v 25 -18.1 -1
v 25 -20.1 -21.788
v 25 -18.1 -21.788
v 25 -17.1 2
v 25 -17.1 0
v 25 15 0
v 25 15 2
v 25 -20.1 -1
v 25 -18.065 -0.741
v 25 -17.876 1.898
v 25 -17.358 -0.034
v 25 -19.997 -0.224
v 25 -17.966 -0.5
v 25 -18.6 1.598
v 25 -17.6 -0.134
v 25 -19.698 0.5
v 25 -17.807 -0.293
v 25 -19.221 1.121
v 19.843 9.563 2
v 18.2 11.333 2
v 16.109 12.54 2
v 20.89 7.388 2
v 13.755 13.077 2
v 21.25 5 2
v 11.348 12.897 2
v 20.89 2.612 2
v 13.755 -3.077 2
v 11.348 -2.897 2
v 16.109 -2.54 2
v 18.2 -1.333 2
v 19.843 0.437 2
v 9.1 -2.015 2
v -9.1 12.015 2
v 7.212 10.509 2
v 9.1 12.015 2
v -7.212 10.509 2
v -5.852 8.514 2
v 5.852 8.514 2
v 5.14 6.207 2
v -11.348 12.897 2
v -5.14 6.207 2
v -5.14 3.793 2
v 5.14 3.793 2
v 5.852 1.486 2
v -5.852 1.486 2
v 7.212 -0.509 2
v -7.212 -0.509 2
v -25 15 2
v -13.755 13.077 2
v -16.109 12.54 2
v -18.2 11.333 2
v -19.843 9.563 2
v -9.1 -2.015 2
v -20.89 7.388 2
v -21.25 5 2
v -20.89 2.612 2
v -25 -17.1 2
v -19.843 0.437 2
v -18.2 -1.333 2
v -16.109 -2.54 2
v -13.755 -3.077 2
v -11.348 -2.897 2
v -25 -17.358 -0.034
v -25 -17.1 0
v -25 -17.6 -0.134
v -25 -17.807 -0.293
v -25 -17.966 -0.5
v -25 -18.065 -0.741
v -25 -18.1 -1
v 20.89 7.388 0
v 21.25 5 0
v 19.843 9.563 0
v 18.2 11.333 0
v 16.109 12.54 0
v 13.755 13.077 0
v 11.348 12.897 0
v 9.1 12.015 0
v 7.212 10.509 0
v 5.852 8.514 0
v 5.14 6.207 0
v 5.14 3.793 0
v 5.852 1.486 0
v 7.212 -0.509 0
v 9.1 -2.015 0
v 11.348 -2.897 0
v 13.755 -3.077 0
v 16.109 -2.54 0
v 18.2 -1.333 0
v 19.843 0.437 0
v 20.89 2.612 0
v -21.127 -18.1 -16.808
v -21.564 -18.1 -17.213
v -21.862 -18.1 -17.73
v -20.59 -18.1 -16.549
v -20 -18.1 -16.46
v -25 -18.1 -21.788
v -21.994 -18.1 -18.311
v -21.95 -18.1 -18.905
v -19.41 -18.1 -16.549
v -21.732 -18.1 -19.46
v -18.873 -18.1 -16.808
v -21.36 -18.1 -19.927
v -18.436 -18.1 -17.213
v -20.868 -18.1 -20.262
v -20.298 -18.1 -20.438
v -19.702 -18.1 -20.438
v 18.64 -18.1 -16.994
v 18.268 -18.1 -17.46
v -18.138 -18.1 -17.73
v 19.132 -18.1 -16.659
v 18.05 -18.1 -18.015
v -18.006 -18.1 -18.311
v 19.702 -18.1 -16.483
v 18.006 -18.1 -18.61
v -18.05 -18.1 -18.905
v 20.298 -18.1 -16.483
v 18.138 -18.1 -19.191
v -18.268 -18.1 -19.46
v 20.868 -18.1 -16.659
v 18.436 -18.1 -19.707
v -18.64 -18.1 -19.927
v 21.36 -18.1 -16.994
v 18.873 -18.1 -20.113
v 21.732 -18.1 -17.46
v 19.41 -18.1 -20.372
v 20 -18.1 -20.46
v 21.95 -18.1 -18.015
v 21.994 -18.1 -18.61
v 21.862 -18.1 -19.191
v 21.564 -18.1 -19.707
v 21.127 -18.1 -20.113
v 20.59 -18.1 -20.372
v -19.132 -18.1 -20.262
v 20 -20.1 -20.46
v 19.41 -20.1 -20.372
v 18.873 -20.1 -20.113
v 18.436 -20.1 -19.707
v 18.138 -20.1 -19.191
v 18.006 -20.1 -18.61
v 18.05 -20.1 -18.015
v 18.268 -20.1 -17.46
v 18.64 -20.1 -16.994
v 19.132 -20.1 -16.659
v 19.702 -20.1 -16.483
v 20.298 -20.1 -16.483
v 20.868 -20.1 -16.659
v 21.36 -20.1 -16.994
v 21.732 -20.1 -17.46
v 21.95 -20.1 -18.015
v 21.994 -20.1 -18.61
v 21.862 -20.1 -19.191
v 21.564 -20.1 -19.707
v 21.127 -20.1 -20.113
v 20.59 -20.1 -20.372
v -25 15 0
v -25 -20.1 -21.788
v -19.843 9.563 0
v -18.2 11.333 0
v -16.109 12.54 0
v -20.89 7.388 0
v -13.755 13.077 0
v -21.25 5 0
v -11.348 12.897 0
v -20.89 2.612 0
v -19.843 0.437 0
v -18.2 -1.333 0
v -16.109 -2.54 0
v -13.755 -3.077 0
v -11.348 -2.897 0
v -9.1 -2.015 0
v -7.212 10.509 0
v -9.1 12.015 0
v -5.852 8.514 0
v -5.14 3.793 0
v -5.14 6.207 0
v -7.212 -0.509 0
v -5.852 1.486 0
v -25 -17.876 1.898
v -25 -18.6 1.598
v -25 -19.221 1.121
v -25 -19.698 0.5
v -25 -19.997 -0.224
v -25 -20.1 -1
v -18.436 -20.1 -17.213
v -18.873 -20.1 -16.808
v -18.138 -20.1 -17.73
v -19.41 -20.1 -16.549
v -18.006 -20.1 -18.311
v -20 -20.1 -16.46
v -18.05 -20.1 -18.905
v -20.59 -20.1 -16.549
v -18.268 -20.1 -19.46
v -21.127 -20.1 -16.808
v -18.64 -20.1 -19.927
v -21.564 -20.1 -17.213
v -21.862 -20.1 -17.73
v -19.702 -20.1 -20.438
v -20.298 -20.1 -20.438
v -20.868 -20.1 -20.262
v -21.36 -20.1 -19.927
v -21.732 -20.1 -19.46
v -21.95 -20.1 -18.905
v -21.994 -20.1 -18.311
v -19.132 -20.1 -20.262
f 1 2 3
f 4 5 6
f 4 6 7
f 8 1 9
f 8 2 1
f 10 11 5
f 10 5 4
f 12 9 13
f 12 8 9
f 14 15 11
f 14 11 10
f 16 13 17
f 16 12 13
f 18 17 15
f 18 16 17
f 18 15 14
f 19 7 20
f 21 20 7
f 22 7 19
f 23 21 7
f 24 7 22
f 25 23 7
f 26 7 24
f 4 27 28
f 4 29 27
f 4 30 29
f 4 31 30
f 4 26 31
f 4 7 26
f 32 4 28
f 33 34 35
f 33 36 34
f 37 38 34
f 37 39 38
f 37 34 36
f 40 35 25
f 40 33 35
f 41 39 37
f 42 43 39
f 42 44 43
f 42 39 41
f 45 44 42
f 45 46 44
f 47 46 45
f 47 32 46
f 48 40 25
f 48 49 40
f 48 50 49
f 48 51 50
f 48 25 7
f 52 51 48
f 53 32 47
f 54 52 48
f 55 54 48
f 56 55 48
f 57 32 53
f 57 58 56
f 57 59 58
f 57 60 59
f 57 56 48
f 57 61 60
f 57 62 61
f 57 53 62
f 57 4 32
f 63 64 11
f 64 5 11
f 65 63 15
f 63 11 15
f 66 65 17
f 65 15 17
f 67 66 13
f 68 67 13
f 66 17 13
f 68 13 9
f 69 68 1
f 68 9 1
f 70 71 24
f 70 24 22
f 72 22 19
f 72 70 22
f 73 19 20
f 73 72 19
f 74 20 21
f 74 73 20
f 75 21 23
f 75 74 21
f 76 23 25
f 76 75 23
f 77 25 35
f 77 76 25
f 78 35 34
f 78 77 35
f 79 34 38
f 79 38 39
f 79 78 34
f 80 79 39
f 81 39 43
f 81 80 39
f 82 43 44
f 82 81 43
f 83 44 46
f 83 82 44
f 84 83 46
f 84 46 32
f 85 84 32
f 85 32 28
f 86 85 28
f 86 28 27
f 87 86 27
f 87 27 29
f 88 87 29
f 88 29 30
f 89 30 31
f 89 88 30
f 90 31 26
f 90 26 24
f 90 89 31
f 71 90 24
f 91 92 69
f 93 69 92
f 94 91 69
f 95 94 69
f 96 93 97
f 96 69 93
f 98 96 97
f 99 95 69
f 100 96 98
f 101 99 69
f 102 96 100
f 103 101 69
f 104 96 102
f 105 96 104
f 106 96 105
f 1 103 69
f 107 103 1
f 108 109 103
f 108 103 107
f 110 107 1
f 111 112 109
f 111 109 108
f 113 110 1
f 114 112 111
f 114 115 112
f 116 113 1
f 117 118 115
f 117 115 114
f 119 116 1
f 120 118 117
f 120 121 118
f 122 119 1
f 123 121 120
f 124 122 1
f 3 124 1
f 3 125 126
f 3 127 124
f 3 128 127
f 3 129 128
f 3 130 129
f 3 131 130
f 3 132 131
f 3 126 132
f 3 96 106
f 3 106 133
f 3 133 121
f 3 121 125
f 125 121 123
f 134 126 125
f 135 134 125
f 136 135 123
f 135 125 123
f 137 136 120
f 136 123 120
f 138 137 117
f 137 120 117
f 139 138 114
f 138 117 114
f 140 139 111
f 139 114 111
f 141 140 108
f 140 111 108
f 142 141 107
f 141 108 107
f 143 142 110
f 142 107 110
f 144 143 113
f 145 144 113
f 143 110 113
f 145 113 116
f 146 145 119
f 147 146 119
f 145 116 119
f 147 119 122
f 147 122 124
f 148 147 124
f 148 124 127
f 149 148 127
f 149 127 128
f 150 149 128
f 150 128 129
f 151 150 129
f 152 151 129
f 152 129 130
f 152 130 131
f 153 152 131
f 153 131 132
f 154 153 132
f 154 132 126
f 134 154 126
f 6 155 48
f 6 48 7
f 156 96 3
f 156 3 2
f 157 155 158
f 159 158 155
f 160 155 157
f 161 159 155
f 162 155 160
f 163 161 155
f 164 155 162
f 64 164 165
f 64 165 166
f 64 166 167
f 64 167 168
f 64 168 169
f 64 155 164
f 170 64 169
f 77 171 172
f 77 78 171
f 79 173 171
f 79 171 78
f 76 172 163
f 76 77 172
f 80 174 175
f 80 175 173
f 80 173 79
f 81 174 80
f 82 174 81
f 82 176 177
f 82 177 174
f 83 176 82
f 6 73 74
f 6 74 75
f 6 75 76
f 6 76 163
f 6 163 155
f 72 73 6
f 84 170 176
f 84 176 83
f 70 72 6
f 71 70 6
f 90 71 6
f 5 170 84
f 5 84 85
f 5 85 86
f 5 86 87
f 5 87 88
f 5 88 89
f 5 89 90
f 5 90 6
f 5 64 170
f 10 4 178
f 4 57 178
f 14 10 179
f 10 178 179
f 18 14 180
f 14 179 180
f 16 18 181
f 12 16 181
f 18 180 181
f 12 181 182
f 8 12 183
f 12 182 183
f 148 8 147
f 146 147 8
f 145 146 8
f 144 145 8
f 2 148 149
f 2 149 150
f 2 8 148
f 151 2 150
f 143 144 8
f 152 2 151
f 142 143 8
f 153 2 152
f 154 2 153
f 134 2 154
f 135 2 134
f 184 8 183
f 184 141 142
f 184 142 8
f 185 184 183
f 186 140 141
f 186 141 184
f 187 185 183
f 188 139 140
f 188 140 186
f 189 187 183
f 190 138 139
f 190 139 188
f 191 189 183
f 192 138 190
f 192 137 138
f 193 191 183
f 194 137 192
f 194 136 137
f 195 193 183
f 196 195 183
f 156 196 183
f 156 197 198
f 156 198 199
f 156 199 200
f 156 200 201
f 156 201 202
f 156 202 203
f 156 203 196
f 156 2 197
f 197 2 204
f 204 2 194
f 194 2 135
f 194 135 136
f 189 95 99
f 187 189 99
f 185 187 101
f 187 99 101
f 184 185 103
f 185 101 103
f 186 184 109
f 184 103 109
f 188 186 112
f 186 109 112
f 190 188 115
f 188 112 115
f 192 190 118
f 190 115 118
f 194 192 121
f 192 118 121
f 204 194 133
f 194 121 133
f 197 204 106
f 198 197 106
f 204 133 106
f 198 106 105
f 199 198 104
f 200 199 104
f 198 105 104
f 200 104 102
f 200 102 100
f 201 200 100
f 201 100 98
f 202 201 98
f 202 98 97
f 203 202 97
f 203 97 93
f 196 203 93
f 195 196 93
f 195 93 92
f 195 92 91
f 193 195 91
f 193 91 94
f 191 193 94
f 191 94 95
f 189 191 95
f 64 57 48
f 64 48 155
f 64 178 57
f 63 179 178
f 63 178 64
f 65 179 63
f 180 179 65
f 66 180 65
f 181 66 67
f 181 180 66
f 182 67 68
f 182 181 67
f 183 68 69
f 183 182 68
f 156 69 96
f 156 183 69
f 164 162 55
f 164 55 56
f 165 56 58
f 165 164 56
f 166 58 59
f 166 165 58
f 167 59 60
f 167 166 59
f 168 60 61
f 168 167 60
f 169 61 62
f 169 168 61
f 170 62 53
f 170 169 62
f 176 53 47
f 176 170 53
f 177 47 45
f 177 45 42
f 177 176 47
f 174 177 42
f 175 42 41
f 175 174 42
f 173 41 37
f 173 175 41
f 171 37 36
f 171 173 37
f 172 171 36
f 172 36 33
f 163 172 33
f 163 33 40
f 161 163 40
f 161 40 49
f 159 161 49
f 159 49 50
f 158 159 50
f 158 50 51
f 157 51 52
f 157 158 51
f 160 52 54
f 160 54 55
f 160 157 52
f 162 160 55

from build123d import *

# Parameters (mm, degrees)
SKETCH1_W           = 50
SKETCH1_H           = 30
SKETCH1_R           = 8.1
BOSS_EXTRUDE1_DEPTH = 2
SKETCH3_W           = 50
SKETCH3_H           = 2
SKETCH5_R           = 2
CUT_EXTRUDE1_DEPTH  = 47.853803709


with BuildPart() as part:
    # Sketch1 → Boss-Extrude1 (new body)
    with BuildSketch(Plane.XY):
        Rectangle(SKETCH1_W, SKETCH1_H)
        with Locations((13.15, 5)):
            Circle(SKETCH1_R, mode=Mode.SUBTRACT)
        with Locations(Location((-13.15, 5, 0), (0, 0, 180))):
            Circle(SKETCH1_R, mode=Mode.SUBTRACT)
    extrude(amount=BOSS_EXTRUDE1_DEPTH)

    # Sweep1: sweep along a path in Sketch2
    with BuildLine(Plane(origin=(25, 0, 0), x_dir=(0, 0, -1), z_dir=(1, 0, 0))) as sweep1_path:
        Line((-1, -15), (-1, -17.099519782))
        ThreePointArc((-1, -17.099519782), (-0.414213562, -18.513733344), (1, -19.099519782))
        Line((1, -19.099519782), (21.787627504, -19.099519782))
    # Sketch3 → Sweep1 (sweep)
    with BuildSketch(Plane.XZ.offset(15)):
        with Locations((0, 1)):
            Rectangle(SKETCH3_W, SKETCH3_H)
    sweep(path=sweep1_path.line)

    # Sketch5 → Cut-Extrude1 (cut, through all)
    with BuildSketch(Plane(origin=(0, -18.099519782, 0), x_dir=(1, 0, 0), z_dir=(0, 1, 0))):
        with Locations(Location((-20, 18.460437776, 0), (0, 0, 270))):
            Circle(SKETCH5_R)
        with Locations(Location((20, 18.460437776, 0), (0, 0, 90))):
            Circle(SKETCH5_R)
    extrude(amount=-CUT_EXTRUDE1_DEPTH, mode=Mode.SUBTRACT)


solid = part.part
